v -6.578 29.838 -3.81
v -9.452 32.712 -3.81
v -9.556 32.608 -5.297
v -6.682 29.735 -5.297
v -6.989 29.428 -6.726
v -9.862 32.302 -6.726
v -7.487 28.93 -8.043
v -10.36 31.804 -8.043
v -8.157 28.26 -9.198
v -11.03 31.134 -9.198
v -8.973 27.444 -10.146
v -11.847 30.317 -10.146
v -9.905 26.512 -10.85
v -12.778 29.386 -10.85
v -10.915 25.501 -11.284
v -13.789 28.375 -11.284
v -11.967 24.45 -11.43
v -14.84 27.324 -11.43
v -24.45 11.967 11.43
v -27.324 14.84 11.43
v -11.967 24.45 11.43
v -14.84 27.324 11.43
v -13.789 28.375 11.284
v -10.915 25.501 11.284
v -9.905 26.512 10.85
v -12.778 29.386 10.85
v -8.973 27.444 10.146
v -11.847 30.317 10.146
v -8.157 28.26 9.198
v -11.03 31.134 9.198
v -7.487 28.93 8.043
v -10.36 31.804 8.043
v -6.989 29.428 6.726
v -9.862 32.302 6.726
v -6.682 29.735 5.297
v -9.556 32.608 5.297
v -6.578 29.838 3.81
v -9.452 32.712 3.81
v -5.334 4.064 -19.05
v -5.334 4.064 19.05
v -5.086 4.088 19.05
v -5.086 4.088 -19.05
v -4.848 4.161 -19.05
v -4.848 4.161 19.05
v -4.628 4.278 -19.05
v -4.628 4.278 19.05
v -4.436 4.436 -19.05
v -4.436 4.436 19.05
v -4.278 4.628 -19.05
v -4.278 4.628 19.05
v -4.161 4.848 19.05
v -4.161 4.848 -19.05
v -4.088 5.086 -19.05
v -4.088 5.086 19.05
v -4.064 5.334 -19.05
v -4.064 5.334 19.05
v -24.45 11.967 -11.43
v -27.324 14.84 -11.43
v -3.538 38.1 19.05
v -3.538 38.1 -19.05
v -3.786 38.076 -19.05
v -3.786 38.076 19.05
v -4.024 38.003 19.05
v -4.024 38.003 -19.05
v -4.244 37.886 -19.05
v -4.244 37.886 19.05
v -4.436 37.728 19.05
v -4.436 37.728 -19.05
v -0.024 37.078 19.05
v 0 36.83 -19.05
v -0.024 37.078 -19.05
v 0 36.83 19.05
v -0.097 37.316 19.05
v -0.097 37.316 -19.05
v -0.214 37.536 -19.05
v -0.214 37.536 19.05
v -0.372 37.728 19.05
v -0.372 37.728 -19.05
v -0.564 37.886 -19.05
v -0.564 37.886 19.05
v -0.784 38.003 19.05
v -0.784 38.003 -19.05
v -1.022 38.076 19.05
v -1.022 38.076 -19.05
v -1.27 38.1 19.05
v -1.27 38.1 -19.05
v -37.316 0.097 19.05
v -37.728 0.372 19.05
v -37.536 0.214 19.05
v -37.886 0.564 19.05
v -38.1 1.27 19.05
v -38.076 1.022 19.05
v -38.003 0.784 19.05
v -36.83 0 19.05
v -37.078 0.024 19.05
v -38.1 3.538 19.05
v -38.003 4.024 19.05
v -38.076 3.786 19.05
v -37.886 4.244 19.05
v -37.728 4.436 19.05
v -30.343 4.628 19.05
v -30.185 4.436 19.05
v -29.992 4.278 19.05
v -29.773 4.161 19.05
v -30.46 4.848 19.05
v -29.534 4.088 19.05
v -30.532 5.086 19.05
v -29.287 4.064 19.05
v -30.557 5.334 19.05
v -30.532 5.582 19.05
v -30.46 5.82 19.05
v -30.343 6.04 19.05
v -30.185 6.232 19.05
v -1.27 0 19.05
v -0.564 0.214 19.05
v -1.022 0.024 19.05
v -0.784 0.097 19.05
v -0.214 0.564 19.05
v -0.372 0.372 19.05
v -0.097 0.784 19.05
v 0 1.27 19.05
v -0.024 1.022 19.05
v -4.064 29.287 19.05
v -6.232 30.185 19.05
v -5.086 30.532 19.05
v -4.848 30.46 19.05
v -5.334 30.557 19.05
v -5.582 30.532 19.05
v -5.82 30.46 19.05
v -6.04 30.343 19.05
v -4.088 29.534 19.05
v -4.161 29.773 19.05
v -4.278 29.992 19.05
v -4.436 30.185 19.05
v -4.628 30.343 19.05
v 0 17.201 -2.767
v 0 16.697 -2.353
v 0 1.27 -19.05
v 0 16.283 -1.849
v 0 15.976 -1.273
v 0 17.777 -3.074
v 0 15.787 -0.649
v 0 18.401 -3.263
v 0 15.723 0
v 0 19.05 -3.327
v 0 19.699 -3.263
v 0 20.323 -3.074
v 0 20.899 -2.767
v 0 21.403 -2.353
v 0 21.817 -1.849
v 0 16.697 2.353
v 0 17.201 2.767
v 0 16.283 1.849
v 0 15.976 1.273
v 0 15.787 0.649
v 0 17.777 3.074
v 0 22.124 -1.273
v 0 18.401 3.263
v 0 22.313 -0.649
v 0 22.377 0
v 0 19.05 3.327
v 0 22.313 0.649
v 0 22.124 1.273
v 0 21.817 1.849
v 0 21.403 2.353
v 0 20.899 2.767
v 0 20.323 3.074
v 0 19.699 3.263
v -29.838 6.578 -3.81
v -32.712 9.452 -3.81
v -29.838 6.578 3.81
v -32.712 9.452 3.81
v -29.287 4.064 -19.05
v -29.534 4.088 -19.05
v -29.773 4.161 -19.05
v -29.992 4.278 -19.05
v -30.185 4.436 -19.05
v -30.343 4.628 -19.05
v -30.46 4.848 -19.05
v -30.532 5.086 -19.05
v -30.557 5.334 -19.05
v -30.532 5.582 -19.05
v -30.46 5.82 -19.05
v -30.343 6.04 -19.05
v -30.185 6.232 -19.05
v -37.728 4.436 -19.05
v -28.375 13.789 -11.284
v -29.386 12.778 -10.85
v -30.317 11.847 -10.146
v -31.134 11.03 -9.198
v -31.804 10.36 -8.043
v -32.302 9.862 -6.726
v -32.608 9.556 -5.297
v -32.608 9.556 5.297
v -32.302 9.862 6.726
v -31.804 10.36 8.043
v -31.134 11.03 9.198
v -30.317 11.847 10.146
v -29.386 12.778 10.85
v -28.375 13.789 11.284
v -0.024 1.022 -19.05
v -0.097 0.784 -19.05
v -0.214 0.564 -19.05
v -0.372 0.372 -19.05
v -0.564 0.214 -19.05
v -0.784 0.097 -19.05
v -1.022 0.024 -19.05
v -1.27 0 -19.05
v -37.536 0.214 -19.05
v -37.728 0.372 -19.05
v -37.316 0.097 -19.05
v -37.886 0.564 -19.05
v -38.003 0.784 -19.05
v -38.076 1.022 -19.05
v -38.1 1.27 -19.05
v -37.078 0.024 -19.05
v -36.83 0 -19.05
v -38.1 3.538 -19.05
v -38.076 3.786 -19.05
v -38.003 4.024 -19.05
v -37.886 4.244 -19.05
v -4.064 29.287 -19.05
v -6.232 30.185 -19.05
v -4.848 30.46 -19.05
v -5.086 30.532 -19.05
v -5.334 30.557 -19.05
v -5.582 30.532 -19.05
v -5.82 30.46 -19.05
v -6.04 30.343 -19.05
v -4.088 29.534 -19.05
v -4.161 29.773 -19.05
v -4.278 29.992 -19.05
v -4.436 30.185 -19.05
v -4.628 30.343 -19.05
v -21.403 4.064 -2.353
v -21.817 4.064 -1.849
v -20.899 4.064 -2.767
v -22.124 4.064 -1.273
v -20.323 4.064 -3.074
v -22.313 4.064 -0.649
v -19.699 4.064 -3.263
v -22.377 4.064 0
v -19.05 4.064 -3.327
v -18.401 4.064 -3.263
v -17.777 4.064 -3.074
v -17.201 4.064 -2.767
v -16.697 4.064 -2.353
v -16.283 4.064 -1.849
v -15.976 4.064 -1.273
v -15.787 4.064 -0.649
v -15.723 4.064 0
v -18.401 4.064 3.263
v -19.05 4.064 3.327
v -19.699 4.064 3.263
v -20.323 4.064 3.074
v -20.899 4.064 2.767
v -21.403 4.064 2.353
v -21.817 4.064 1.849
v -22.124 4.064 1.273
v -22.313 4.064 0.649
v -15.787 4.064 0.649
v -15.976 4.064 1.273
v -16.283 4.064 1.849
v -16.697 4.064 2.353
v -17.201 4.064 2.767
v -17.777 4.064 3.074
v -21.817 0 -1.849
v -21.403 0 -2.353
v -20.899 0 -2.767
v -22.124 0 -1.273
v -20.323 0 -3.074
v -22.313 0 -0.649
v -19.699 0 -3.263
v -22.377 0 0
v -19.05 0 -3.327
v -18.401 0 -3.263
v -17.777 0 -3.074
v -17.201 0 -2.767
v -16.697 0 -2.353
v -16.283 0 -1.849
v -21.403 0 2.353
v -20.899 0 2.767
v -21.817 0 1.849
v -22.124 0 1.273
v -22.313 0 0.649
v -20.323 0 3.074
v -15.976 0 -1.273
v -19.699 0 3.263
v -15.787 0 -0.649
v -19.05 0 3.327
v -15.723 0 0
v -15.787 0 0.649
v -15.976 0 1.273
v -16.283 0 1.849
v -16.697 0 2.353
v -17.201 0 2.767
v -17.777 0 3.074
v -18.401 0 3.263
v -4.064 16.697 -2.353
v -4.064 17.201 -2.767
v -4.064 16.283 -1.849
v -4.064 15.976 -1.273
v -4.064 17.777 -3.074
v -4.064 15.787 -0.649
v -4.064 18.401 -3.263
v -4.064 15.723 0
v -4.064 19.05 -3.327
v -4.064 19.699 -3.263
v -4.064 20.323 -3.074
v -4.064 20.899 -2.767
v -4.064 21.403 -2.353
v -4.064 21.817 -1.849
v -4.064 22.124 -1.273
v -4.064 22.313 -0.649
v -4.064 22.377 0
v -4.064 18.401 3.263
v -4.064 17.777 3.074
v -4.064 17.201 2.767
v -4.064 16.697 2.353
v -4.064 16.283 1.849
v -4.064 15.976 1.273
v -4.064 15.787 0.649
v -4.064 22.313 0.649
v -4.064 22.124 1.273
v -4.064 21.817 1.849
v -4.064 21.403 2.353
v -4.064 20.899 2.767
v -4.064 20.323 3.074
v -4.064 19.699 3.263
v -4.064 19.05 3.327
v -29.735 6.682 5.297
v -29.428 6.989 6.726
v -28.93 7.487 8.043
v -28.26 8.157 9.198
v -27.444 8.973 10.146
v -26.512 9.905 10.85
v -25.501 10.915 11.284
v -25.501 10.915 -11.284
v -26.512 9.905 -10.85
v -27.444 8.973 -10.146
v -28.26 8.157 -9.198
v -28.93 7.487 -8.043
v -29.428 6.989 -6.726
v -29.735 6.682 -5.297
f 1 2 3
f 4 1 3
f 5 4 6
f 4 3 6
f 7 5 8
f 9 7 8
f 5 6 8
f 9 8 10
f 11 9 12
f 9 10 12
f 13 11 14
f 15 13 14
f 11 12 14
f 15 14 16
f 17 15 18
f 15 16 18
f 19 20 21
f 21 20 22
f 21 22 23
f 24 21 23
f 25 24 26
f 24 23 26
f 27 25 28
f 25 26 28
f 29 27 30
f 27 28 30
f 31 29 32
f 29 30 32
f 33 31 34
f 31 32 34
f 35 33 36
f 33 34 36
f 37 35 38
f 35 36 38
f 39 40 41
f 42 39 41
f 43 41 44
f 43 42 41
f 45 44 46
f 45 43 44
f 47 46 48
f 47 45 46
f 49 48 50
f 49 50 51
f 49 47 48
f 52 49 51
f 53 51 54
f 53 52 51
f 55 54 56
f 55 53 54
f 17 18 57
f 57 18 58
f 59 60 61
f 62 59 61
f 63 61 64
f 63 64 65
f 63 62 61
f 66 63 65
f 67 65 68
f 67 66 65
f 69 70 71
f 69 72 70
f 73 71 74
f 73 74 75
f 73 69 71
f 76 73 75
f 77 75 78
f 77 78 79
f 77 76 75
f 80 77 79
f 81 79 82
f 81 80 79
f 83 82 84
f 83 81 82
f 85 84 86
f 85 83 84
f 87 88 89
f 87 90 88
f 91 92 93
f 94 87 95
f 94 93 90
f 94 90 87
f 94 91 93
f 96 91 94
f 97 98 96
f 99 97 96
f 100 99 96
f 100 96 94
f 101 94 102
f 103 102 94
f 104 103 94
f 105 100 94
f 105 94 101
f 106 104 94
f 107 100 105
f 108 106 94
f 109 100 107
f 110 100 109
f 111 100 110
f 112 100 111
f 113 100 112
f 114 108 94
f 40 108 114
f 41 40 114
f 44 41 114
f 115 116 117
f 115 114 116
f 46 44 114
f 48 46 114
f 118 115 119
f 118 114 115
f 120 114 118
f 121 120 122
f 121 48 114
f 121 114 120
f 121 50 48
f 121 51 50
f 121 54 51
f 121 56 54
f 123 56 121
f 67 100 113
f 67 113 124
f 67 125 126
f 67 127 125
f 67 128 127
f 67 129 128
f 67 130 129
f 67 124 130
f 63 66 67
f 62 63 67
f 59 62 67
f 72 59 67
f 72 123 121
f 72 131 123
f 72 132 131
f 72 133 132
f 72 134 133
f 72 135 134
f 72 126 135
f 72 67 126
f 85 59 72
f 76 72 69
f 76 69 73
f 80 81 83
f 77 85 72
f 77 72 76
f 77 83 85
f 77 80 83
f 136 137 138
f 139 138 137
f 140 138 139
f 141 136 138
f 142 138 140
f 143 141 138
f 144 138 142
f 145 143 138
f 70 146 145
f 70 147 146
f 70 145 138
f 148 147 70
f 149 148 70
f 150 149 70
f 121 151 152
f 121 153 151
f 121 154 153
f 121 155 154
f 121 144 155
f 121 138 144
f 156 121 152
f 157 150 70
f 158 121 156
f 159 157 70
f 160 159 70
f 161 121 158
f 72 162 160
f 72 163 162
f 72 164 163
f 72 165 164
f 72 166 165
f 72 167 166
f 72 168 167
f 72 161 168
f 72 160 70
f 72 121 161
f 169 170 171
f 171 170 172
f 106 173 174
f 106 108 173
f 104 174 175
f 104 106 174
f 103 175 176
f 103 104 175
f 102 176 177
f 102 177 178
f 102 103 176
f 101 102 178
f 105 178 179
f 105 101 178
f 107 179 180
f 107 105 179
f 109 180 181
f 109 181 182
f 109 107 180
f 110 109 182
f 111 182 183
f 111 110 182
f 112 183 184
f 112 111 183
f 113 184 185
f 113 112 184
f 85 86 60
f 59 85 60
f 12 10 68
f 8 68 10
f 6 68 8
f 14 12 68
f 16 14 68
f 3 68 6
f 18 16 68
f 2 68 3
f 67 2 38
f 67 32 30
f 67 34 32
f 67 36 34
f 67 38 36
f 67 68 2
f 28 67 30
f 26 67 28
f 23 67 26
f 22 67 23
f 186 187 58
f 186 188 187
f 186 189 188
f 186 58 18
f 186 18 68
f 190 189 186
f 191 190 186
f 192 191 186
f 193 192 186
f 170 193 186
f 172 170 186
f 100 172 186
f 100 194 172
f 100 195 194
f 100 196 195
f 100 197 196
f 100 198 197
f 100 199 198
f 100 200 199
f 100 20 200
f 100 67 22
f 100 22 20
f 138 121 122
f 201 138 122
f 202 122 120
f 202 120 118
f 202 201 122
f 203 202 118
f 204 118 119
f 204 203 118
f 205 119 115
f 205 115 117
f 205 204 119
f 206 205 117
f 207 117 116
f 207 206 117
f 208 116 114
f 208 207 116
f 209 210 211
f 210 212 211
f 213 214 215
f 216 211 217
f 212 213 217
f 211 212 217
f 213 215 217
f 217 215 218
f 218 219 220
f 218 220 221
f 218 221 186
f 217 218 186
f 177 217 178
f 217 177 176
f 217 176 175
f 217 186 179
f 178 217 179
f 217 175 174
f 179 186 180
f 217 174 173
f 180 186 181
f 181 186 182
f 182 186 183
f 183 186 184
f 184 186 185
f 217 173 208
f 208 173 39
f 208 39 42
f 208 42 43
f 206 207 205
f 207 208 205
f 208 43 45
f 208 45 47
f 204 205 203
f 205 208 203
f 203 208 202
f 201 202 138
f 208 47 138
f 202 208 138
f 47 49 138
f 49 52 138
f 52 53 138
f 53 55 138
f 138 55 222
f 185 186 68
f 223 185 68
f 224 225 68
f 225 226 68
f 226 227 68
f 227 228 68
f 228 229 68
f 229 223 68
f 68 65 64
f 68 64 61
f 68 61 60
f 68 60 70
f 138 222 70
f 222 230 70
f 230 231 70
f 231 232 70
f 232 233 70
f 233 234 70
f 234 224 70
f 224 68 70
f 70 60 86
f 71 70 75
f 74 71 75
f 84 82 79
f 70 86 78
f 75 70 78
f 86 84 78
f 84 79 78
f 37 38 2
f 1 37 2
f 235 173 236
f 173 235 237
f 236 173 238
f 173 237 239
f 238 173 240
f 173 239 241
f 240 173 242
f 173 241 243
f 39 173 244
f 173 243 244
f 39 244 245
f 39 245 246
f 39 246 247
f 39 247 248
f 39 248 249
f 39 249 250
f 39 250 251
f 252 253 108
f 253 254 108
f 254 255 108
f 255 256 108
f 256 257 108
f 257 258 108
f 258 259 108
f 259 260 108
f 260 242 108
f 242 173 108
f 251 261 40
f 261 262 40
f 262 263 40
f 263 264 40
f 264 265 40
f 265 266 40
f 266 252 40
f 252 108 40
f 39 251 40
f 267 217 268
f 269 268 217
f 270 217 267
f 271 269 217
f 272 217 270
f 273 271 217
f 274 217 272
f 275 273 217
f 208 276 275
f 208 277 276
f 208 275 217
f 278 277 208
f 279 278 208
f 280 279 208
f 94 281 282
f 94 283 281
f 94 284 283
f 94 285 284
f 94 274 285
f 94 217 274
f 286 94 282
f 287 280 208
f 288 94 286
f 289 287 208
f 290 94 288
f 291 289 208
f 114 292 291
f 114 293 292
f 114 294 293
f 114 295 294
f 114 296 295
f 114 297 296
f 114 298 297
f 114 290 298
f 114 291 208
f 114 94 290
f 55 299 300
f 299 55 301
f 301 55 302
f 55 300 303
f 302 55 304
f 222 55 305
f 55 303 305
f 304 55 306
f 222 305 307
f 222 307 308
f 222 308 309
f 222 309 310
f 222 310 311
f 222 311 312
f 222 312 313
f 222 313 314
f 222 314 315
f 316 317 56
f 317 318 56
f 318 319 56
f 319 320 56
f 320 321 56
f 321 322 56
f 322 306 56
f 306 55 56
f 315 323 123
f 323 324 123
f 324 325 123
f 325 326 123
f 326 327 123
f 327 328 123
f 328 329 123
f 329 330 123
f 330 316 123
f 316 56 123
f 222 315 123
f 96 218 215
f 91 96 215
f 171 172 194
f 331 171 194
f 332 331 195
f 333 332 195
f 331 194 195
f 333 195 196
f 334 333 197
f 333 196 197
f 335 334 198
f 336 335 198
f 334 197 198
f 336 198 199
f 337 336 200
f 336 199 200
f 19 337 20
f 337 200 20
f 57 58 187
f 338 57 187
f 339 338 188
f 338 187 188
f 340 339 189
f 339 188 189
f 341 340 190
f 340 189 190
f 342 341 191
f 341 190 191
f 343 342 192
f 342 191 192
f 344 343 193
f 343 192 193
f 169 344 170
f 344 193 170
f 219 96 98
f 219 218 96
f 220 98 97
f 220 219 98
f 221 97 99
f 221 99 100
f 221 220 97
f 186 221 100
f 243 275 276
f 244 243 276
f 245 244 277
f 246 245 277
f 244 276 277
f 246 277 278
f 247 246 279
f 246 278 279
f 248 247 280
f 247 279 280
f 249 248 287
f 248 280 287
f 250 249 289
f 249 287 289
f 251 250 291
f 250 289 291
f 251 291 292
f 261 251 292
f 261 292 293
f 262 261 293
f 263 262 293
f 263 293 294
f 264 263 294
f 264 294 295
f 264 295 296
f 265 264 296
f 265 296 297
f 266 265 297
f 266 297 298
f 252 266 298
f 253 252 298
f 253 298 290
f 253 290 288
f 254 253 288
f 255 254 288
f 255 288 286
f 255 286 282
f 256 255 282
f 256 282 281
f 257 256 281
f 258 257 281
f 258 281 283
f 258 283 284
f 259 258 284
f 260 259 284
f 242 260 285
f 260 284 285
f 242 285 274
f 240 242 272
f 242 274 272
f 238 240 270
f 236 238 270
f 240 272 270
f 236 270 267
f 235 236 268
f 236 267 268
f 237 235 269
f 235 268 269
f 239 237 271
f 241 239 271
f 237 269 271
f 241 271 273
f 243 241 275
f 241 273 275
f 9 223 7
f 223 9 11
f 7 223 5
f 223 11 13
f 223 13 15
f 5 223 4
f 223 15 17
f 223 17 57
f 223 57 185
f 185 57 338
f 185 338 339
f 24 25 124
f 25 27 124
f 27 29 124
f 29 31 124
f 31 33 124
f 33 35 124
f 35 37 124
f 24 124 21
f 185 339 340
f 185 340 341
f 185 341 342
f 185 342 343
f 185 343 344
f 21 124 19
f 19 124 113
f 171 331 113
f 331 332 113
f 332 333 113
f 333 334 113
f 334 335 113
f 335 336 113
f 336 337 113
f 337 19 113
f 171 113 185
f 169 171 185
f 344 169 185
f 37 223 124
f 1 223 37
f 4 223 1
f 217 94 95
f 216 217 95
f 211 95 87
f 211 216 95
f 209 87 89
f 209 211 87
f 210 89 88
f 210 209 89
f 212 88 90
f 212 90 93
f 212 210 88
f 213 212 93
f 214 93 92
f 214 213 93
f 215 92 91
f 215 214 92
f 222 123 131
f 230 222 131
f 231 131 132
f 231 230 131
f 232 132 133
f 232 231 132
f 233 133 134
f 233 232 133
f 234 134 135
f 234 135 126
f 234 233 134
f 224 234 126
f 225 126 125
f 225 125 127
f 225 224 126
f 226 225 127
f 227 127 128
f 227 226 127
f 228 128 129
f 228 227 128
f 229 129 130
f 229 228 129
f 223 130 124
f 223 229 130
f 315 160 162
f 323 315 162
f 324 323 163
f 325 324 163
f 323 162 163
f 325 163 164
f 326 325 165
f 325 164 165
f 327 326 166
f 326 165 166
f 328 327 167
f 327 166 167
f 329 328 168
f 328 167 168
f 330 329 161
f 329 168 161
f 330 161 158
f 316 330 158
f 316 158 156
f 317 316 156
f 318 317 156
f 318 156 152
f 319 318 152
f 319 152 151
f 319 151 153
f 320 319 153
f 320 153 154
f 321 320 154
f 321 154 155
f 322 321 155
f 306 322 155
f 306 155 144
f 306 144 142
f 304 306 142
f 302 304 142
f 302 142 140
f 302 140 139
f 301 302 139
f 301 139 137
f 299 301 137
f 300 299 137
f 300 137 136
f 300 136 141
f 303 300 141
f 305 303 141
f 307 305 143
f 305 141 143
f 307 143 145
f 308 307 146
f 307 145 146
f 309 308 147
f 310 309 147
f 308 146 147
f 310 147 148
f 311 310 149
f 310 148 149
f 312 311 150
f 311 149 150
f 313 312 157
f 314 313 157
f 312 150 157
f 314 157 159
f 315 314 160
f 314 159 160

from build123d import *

# Parameters (mm, degrees)
BOSS_EXTRUDE1_DEPTH = 19.05
CUT_EXTRUDE2_REACH  = 59.15
SKETCH3_R           = 3.3274
CUT_EXTRUDE3_REACH  = 59.15
SKETCH4_R           = 3.3274
CUT_EXTRUDE1_REACH  = 37.381
FILLET1_R           = 1.27


with BuildPart() as part:
    # Sketch1 → Boss-Extrude1 (new, symmetric)
    with BuildSketch(Plane.XY):
        Polygon((0, 0), (0, 38.1), (-4.064, 38.1), (-38.1, 4.064), (-38.1, 0), align=None)
        Polygon((-32.352636083, 4.064), (-4.064, 4.064), (-4.064, 32.352636083), align=None, mode=Mode.SUBTRACT)
    extrude(amount=BOSS_EXTRUDE1_DEPTH, both=True)

    # Sketch3 → Cut-Extrude2 (cut, up to next)
    with BuildSketch(Plane(origin=(0, 0, 0), x_dir=(0, 0, -1), z_dir=(1, 0, 0)), mode=Mode.PRIVATE) as cut_extrude2_sk1:
        with Locations(Location((0, 19.05, 0), (0, 0, 90))):
            Circle(SKETCH3_R)
    cut_extrude2_tool1 = extrude(cut_extrude2_sk1.sketch, amount=-CUT_EXTRUDE2_REACH, mode=Mode.PRIVATE) & part.part
    add(cut_extrude2_tool1.solids().sort_by_distance((0, 19.05, 0))[0], mode=Mode.SUBTRACT)

    # Sketch4 → Cut-Extrude3 (cut, up to next)
    with BuildSketch(Plane.XZ, mode=Mode.PRIVATE) as cut_extrude3_sk1:
        with Locations(Location((-19.05, 0, 0), (0, 0, 270))):
            Circle(SKETCH4_R)
    cut_extrude3_tool1 = extrude(cut_extrude3_sk1.sketch, amount=-CUT_EXTRUDE3_REACH, mode=Mode.PRIVATE) & part.part
    add(cut_extrude3_tool1.solids().sort_by_distance((-19.05, 0, 0))[0], mode=Mode.SUBTRACT)

    # Sketch2 → Cut-Extrude1 (cut, up to next)
    with BuildSketch(Plane(origin=(-21.082, 21.082, 0), x_dir=(0, 0, 1), z_dir=(-0.7071067811865477, 0.7071067811865475, 0)), mode=Mode.PRIVATE) as cut_extrude1_sk1:
        with BuildLine():
            Line((3.81, 16.447086404), (-3.81, 16.447086404))
            ThreePointArc((-3.81, 16.447086404), (-9.198153673, 14.215240077), (-11.43, 8.827086404))
            Line((-11.43, 8.827086404), (-11.43, -8.827086404))
            ThreePointArc((-11.43, -8.827086404), (-9.198153673, -14.215240077), (-3.81, -16.447086404))
            Line((-3.81, -16.447086404), (3.81, -16.447086404))
            ThreePointArc((3.81, -16.447086404), (9.198153673, -14.215240077), (11.43, -8.827086404))
            Line((11.43, -8.827086404), (11.43, 8.827086404))
            ThreePointArc((11.43, 8.827086404), (9.198153673, 14.215240077), (3.81, 16.447086404))
        make_face()
    cut_extrude1_tool1 = extrude(cut_extrude1_sk1.sketch, amount=-CUT_EXTRUDE1_REACH, mode=Mode.PRIVATE) & part.part
    add(cut_extrude1_tool1.solids().sort_by_distance((-21.082, 21.082, 0))[0], mode=Mode.SUBTRACT)

    # Fillet1
    fillet1_edges = [part.edges().sort_by_distance(p)[0] for p in [
        (-4.064, 4.064, 0),
        (-4.064, 32.352636083, 0),
        (-32.352636083, 4.064, 0),
        (-38.1, 0, 0),
        (-38.1, 4.064, 0),
        (-4.064, 38.1, 0),
        (0, 38.1, 0),
        (0, 0, 0),
    ]]
    fillet(fillet1_edges, radius=FILLET1_R)


solid = part.part
